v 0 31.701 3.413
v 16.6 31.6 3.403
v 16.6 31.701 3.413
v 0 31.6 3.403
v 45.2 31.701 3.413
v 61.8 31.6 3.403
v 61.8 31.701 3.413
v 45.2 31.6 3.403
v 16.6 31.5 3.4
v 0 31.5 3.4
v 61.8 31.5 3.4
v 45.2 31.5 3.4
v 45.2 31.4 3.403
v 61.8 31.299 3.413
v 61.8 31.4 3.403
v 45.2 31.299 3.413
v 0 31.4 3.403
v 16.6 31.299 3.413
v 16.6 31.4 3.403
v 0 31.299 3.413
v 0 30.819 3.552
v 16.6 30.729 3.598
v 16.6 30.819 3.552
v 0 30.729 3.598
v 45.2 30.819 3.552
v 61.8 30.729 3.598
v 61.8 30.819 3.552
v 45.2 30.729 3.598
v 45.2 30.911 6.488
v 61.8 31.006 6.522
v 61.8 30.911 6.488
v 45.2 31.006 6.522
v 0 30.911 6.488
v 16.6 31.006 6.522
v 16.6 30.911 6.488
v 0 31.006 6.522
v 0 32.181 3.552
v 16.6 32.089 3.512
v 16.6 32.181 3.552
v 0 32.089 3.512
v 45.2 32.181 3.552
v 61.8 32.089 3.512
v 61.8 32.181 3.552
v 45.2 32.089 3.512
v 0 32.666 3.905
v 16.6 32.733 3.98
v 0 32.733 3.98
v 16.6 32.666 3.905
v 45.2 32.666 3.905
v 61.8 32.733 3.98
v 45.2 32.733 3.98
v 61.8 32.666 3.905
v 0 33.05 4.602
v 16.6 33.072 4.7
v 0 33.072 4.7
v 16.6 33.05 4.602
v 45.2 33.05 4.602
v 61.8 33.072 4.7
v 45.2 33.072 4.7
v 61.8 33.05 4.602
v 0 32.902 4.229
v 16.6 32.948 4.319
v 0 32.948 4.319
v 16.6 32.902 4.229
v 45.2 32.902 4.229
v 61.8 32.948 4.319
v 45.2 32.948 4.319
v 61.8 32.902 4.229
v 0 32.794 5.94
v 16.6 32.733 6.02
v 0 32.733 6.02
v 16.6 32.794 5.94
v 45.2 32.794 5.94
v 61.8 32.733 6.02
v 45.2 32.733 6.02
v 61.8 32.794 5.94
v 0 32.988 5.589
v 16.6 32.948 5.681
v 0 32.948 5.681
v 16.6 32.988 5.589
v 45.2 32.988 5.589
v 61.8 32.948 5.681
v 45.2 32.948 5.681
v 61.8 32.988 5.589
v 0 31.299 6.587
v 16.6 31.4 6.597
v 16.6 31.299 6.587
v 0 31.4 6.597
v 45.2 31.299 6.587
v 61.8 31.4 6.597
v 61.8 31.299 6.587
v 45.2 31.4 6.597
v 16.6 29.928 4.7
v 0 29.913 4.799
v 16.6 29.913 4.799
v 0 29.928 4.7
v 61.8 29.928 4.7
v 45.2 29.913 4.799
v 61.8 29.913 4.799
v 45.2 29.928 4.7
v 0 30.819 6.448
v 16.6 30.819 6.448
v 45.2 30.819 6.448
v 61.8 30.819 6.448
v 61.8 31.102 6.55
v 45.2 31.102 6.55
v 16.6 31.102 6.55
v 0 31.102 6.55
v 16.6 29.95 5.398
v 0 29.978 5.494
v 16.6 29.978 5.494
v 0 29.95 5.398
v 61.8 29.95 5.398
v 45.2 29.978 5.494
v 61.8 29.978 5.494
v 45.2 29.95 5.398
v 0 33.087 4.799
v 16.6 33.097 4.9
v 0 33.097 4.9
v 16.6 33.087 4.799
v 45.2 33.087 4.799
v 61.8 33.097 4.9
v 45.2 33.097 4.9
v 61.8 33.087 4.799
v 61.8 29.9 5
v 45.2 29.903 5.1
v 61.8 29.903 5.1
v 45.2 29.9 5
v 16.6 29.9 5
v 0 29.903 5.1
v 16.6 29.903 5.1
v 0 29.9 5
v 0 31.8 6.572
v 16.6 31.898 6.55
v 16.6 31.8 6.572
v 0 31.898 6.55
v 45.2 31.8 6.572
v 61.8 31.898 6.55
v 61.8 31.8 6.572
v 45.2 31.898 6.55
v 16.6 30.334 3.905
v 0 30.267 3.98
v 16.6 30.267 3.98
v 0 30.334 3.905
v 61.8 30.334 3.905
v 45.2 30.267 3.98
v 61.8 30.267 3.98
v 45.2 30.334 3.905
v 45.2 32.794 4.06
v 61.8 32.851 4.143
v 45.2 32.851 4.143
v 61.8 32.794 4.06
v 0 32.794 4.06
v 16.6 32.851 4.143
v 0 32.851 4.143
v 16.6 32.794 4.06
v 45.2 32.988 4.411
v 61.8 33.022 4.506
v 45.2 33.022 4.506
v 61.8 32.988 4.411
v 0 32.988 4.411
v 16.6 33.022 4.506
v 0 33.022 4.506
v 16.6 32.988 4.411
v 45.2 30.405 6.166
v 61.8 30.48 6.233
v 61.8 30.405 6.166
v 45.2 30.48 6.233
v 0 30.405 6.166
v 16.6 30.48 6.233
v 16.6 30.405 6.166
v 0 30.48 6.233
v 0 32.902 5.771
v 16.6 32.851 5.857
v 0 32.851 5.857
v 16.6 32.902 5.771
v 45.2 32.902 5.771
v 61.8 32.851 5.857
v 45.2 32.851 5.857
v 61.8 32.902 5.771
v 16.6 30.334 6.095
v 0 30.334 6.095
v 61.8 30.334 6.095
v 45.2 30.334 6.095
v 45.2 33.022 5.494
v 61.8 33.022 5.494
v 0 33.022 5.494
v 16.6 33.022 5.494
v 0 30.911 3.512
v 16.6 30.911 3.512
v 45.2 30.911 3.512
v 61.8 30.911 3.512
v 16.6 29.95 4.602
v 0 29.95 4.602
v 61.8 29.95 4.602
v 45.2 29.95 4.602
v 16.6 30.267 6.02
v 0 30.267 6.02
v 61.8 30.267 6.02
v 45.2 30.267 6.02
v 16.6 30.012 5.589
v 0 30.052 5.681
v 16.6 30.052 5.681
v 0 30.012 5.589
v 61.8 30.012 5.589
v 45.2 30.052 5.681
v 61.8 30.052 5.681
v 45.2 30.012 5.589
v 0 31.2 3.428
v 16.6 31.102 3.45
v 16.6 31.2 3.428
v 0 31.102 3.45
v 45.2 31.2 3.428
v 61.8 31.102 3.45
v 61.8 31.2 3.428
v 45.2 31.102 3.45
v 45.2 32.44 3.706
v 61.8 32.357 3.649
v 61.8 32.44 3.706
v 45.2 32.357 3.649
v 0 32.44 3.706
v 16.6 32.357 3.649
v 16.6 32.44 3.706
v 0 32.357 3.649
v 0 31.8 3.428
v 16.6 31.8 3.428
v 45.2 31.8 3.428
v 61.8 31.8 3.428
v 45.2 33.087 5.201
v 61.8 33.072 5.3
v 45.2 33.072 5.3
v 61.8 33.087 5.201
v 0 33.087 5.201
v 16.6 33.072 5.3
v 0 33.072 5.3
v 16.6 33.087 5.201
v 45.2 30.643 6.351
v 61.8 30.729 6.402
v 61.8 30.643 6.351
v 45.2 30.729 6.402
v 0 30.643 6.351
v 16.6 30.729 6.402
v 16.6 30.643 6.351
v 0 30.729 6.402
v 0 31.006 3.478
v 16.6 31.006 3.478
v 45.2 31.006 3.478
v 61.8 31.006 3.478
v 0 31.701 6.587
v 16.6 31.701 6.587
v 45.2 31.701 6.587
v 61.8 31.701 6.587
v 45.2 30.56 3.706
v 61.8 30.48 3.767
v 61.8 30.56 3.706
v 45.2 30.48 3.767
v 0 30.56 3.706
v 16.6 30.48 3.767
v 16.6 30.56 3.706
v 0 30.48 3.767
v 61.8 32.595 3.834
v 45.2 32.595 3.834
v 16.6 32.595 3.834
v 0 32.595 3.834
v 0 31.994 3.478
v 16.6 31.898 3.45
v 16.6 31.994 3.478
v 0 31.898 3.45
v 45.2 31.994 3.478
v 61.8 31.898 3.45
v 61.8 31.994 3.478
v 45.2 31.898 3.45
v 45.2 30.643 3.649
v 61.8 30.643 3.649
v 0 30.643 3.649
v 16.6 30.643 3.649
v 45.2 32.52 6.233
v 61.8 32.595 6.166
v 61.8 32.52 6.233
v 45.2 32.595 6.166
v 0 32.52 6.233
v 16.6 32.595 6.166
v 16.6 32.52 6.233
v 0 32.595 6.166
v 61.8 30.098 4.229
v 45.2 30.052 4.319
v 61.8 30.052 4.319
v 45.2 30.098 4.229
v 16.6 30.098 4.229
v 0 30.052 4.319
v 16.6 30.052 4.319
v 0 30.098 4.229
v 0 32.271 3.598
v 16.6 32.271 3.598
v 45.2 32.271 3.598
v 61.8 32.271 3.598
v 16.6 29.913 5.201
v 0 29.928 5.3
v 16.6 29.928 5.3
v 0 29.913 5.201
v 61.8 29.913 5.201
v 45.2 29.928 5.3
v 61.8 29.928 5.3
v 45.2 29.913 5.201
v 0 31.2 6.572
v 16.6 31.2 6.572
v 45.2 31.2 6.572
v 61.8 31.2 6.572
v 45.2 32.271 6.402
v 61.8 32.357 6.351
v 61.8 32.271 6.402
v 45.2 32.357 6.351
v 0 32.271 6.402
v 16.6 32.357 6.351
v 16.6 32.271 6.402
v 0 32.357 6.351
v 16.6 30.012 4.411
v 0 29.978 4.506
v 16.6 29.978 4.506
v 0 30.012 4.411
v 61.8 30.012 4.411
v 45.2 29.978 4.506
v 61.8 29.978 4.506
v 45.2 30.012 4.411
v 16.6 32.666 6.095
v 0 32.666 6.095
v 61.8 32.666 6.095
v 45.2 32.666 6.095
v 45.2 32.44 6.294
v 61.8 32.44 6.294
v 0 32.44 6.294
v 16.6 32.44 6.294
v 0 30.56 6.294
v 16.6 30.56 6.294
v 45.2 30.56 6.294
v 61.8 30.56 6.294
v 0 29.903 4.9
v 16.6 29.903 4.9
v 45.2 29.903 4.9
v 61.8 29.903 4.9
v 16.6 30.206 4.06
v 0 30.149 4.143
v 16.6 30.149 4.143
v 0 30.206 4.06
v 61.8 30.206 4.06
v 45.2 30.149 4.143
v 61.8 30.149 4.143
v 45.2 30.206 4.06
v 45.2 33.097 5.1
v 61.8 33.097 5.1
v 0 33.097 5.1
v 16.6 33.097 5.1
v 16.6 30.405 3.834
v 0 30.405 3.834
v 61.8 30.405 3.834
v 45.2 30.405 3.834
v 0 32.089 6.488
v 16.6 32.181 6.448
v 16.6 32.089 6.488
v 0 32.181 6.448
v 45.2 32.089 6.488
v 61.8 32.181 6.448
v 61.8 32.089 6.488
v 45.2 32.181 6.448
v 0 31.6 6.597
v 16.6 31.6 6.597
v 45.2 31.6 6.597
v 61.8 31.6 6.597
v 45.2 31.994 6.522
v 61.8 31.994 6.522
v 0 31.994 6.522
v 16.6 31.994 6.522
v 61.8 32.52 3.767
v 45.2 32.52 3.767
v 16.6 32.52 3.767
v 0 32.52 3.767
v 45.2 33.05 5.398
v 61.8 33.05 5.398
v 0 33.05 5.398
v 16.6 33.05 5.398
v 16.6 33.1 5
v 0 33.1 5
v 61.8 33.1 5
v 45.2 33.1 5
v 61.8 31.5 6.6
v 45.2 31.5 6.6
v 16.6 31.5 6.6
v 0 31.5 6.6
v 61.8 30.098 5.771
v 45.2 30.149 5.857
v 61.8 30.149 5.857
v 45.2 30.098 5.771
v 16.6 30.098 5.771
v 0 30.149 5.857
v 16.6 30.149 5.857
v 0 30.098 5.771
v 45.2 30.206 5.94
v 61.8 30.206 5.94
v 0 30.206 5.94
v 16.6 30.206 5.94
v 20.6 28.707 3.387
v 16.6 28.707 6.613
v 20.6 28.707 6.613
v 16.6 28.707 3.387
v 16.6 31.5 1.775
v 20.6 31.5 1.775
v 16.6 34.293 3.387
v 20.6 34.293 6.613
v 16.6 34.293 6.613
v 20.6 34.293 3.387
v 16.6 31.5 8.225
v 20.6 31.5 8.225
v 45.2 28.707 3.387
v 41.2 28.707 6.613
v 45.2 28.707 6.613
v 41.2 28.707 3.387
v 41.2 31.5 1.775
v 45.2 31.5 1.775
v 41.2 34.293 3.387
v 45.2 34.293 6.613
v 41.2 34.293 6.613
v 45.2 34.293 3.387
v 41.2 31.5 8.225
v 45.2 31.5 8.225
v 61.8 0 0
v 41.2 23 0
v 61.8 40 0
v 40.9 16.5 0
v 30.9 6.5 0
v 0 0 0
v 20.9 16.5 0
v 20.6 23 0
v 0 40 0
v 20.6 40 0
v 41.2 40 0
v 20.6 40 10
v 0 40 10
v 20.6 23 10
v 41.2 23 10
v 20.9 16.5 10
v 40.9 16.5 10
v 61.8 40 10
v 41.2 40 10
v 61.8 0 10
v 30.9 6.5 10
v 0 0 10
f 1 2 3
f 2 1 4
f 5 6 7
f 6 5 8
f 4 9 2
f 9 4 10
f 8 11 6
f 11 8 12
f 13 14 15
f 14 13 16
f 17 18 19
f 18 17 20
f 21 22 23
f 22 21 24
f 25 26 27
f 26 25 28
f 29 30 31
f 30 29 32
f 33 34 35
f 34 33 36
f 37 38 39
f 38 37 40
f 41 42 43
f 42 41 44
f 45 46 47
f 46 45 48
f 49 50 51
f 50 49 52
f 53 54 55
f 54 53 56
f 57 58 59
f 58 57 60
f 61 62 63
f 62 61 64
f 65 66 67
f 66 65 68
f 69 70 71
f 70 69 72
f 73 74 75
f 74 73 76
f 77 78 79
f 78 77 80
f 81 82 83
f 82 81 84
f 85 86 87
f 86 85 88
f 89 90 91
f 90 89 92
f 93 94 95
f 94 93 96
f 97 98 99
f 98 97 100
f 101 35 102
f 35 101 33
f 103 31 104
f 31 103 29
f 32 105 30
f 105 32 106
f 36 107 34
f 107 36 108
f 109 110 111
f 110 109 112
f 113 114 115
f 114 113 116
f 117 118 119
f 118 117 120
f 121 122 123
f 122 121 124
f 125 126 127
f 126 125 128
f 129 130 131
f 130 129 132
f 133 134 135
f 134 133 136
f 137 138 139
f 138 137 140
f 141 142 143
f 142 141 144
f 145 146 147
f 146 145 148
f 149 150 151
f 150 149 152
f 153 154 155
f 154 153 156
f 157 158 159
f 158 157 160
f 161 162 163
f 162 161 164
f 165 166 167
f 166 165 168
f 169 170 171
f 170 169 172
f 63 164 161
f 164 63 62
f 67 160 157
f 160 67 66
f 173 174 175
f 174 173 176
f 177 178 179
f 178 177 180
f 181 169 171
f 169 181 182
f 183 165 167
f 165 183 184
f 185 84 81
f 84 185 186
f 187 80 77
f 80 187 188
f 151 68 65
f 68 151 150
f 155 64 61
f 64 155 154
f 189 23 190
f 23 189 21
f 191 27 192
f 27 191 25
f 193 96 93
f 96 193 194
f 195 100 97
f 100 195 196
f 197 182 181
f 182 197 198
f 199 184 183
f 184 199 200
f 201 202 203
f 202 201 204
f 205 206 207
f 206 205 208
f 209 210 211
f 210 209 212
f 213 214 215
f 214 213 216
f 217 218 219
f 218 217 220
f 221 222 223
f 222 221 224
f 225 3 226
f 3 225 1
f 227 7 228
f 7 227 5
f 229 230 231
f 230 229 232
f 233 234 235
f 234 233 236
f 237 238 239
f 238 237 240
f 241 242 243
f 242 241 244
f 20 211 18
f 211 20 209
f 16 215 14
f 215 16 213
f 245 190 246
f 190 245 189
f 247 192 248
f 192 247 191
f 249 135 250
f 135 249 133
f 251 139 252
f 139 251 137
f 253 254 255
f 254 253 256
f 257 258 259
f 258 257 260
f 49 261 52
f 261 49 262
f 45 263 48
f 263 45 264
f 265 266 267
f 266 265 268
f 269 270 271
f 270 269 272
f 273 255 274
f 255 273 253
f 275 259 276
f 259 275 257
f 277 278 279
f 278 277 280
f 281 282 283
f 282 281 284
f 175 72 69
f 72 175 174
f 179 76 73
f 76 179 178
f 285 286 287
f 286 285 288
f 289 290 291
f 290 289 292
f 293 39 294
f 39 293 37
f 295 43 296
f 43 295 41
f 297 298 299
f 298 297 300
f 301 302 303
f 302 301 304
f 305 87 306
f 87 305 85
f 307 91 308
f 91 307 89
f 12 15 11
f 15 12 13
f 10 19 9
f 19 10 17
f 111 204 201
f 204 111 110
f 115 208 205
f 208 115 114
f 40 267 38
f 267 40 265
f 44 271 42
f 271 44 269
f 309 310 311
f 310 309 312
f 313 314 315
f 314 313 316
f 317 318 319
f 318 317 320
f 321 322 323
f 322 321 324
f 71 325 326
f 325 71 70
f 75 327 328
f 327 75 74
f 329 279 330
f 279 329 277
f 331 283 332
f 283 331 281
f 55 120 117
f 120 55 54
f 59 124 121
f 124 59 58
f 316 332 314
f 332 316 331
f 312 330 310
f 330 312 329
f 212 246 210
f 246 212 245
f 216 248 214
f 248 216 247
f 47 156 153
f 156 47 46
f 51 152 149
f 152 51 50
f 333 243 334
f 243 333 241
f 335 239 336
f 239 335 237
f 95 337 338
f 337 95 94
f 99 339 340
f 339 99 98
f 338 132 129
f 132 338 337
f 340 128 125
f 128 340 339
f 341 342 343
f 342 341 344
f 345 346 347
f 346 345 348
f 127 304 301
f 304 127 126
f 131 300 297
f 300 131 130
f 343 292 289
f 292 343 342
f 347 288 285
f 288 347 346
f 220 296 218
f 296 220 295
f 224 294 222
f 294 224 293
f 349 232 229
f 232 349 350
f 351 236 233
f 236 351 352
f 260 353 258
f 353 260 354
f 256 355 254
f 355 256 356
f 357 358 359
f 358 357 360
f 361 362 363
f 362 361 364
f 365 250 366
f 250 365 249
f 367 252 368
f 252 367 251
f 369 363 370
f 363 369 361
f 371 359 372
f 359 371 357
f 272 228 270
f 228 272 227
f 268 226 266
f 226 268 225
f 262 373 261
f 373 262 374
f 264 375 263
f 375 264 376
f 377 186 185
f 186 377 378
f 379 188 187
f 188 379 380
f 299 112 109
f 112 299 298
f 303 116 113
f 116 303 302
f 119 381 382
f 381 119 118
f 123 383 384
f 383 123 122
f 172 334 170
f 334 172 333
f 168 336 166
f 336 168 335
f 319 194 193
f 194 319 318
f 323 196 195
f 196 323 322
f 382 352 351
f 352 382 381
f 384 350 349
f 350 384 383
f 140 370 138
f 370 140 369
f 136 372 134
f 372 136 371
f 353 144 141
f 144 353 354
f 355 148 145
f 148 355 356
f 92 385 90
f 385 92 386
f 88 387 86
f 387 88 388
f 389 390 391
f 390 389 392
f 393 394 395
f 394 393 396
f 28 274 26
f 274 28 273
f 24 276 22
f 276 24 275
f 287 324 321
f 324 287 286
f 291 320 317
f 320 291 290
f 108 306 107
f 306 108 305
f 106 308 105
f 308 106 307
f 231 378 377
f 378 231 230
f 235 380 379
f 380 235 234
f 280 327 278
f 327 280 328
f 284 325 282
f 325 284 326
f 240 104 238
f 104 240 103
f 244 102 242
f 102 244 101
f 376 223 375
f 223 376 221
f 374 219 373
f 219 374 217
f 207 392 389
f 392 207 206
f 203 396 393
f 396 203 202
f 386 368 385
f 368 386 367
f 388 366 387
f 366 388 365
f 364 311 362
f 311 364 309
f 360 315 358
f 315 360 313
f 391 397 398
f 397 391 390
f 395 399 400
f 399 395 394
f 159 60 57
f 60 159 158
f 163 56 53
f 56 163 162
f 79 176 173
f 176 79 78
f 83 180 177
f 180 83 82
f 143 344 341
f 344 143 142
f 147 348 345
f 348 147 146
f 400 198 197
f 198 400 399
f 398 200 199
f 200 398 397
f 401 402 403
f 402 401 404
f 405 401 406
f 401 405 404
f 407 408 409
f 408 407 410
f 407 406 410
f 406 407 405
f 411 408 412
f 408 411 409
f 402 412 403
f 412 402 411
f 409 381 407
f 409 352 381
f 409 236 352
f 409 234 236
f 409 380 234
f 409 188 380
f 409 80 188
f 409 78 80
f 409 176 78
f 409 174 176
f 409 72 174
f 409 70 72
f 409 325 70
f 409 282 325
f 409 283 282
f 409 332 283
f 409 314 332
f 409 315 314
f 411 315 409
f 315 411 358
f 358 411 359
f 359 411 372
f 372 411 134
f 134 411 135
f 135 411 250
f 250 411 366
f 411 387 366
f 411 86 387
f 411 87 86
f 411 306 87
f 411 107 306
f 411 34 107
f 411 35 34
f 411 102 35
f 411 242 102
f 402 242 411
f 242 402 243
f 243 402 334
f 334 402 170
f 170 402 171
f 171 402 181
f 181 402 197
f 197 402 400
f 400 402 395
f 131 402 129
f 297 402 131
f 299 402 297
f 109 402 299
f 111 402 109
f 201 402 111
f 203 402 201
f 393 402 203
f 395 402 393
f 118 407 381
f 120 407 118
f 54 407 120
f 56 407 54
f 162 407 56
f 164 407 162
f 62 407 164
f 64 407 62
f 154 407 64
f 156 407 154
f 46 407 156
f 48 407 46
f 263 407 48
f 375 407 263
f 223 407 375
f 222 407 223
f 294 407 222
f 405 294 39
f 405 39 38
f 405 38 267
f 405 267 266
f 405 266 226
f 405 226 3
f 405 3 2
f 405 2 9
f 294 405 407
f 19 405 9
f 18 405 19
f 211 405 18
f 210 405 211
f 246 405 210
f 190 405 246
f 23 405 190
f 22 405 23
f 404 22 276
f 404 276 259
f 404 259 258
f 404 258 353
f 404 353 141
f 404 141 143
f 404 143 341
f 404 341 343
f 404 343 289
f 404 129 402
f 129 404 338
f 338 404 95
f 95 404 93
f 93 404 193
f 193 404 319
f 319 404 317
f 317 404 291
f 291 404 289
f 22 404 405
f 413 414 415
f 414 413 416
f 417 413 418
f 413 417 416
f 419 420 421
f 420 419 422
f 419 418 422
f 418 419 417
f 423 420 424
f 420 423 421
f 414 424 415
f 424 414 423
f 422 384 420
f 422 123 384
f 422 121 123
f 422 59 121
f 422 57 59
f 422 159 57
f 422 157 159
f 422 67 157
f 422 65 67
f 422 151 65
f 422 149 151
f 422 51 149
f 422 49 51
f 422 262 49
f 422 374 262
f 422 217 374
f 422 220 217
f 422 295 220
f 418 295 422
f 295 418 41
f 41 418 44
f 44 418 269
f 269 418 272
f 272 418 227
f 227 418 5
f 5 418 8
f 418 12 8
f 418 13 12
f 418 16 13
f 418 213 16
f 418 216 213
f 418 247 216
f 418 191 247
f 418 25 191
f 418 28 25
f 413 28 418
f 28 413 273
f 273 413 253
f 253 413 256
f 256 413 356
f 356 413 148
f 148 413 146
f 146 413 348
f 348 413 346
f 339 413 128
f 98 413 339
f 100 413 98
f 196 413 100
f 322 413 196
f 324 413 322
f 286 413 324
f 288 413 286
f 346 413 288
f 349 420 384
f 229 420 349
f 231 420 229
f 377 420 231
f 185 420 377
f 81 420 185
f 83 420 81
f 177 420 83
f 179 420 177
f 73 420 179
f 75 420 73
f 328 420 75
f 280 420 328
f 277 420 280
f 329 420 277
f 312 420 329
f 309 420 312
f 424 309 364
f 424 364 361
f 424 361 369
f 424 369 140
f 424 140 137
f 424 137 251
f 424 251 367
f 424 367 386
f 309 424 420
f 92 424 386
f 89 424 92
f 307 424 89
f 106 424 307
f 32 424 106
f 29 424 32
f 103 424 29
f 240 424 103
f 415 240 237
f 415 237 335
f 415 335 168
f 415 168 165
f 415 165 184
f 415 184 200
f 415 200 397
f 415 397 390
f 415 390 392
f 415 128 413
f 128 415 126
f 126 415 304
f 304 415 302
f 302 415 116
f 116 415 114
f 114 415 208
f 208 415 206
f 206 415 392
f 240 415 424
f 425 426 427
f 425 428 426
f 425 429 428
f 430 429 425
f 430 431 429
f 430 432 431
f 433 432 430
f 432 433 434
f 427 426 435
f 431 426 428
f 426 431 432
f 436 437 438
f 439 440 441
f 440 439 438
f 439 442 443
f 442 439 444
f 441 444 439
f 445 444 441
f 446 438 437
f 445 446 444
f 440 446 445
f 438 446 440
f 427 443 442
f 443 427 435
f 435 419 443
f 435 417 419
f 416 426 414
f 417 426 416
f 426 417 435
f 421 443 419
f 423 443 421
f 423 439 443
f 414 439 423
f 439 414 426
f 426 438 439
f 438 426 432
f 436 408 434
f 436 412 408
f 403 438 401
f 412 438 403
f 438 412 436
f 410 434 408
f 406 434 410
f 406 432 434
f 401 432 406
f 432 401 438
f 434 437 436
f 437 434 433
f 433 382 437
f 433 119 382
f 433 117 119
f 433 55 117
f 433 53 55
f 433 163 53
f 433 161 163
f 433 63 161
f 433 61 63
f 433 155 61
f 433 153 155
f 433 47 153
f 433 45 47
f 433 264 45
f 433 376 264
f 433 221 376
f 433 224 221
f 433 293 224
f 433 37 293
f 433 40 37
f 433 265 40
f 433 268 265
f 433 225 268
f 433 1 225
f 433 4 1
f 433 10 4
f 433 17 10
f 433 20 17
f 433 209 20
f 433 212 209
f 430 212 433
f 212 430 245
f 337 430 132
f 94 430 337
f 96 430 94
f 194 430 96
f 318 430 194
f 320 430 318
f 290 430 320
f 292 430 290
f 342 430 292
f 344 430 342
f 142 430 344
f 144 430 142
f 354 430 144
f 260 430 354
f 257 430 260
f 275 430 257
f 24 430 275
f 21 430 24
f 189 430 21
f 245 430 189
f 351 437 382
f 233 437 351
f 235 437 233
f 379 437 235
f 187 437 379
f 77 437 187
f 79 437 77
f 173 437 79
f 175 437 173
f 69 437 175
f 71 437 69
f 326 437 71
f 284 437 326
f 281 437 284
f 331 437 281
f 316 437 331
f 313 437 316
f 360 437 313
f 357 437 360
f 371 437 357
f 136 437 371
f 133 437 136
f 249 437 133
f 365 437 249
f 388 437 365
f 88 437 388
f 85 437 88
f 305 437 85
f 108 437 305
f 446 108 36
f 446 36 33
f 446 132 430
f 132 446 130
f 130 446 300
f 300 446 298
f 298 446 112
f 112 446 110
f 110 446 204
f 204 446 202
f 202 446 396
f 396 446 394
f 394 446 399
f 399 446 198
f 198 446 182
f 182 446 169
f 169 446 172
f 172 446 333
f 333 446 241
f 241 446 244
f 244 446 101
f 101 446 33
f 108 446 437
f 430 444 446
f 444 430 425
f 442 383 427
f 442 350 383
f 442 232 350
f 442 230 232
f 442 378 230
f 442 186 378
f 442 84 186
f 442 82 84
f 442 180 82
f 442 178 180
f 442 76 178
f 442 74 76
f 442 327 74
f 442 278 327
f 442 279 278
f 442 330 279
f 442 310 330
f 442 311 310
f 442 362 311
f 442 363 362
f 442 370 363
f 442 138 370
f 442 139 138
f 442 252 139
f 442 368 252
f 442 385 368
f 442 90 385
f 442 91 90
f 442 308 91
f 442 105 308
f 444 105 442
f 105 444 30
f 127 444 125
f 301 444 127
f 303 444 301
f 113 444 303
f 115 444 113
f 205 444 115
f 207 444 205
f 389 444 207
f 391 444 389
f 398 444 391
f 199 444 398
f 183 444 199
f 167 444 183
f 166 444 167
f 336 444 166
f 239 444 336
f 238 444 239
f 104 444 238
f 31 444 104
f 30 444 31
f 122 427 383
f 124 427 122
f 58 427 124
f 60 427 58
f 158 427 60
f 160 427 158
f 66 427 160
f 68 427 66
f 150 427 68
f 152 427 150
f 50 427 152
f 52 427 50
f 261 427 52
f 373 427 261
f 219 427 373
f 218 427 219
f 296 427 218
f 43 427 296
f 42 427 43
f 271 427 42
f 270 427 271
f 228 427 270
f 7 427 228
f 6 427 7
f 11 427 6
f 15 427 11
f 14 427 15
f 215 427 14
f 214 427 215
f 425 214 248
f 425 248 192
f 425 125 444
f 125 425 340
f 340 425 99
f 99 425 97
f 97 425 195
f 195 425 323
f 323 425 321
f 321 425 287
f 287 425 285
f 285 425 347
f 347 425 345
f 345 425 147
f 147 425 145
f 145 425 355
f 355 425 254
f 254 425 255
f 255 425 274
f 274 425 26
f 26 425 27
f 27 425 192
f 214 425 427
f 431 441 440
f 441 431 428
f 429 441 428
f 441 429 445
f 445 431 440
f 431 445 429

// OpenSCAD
// file: iso3167.scad
iso3167_A = [
    "l1", 80,
    "l2", (104+113)/2,
    "l3", 170,
    "b1", 10,
    "b2", 20.0,
    "r", 24,
    "h", 4.0
];

iso3167_B = [
    "l1", 60.0,
    "l2", (106+110)/2,
    "l3", 150,
    "b1", 10,
    "b2", 20.0,
    "r", 60.0,
    "h", 4.0
];

function hash(h, k)=
(
    h[search([k], [for(i=[0:2:len(h)-2])h[i]])[0]*2+1]
);

module iso3167(
    l1 = undef,
    l2 = undef,
    l3 = undef,
    b1 = undef,
    b2 = undef,
    r = undef,
    h = undef,
    type = "A") {

    m_l1 = (l1 != undef) ? l1 : (type=="A" ? hash(iso3167_A,"l1") : type=="B" ? hash(iso3167_B, "l1") : undef);
    m_l2_max = (l2 != undef) ? l2 : (type=="A" ? hash(iso3167_A,"l2") : type=="B" ? hash(iso3167_B, "l2") : undef);
    m_l3 = (l3 != undef) ? l3 : (type=="A" ? hash(iso3167_A,"l3") : type=="B" ? hash(iso3167_B, "l3") : undef);
    m_b1 = (b1 != undef) ? b1 : (type=="A" ? hash(iso3167_A,"b1") : type=="B" ? hash(iso3167_B, "b1") : undef);
    m_b2 = (b2 != undef) ? b2 : (type=="A" ? hash(iso3167_A,"b2") : type=="B" ? hash(iso3167_B, "b2") : undef);
    m_r = (r != undef) ? r : (type=="A" ? hash(iso3167_A,"r") : type=="B" ? hash(iso3167_B, "r") : undef);
    m_h = (h != undef) ? h : (type=="A" ? hash(iso3167_A,"h") : type=="B" ? hash(iso3167_B, "h") : undef);

    neck_cut_width = (m_b2 - m_b1)/2;

    theta = acos((m_r - neck_cut_width)/m_r);
    fillet_width = sin(theta);
    m_l2 = ((m_l2_max - m_l1)/2 >= fillet_width) ? m_l2_max : m_l3 - 2*fillet_width ;

    neck_cut_xoff = (m_l3 - m_l1)/2;
    neck_cut_yoff = (m_b2 - neck_cut_width);

    neck_fillet_xoff1 = neck_cut_xoff;
    neck_fillet_xoff2 = m_l3 - neck_cut_xoff;
    neck_fillet_yoff1 = -m_r + neck_cut_width;
    neck_fillet_yoff2 = neck_cut_yoff + m_r;


    linear_extrude(height=m_h) {
        difference() {
            // Bounding rectangle
            square([m_l3, m_b2]);

            // Neck area
            translate([neck_cut_xoff, 0])
                square([m_l1, neck_cut_width]);
            translate([neck_cut_xoff, neck_cut_yoff])
                square([m_l1, neck_cut_width]);


            translate([neck_fillet_xoff1, neck_fillet_yoff1])
                circle(r=m_r);
            translate([neck_fillet_xoff1, neck_fillet_yoff2])
                circle(r=m_r);
            translate([neck_fillet_xoff2, neck_fillet_yoff1])
                circle(r=m_r);
            translate([neck_fillet_xoff2, neck_fillet_yoff2])
                circle(r=m_r);
        }
    }
};

module iso3167_clamp(
    l1 = undef,
    l2 = undef,
    l3 = undef,
    b1 = undef,
    b2 = undef,
    r = undef,
    h = undef,
    depth = undef,
    width = undef,
    outer_width = undef,
    outer_depth = undef,
    tri_width = undef,
    tol = 0.3,
    hole_dia = 3.2,
    nut_width = 5.5,
    nut_depth = 3,
    type = "A") {


    m_l1 = (l1 != undef) ? l1 : (type=="A" ? hash(iso3167_A,"l1") : type=="B" ? hash(iso3167_B, "l1") : undef);
    m_l2_max = (l2 != undef) ? l2 : (type=="A" ? hash(iso3167_A,"l2") : type=="B" ? hash(iso3167_B, "l2") : undef);
    m_l3 = (l3 != undef) ? l3 : (type=="A" ? hash(iso3167_A,"l3") : type=="B" ? hash(iso3167_B, "l3") : undef);
    m_b1 = (b1 != undef) ? b1 : (type=="A" ? hash(iso3167_A,"b1") : type=="B" ? hash(iso3167_B, "b1") : undef);
    m_b2 = (b2 != undef) ? b2 : (type=="A" ? hash(iso3167_A,"b2") : type=="B" ? hash(iso3167_B, "b2") : undef);
    m_r = (r != undef) ? r : (type=="A" ? hash(iso3167_A,"r") : type=="B" ? hash(iso3167_B, "r") : undef);
    m_h = (h != undef) ? h : (type=="A" ? hash(iso3167_A,"h") : type=="B" ? hash(iso3167_B, "h") : undef);

    neck_cut_width = (m_b2 - m_b1)/2;

    theta = acos((m_r - neck_cut_width)/m_r);
    fillet_width = sin(theta);
    m_l2 = ((m_l2_max - m_l1)/2 >= fillet_width) ? m_l2_max : m_l3 - 2*fillet_width ;

    m_depth = (depth != undef) ? depth : (m_l3 - m_l2)/1;
    m_width = (width != undef) ? width :  m_b2 + tol*2;
    m_outer_depth = (outer_depth != undef) ? outer_depth : m_b2 * 2;
    m_outer_width = (outer_width != undef) ? outer_width : m_width * 3;
    m_tri_width = (tri_width != undef) ? tri_width :  m_b2;
    m_tri_depth = m_tri_width / 2;

    echo(m_depth);

    difference() {
        linear_extrude(height=m_h) {
            difference() {
                square([m_outer_width, m_outer_depth]);

                translate([(m_outer_width - m_width)/2, m_outer_depth - m_depth])
                    square([m_width, m_depth]);

                translate([m_outer_width/2, (m_outer_depth - m_depth)/2])
                    polygon(points=[
                        [-m_tri_width/2, m_tri_depth/2],
                        [m_tri_width/2, m_tri_depth/2],
                        [0, -m_tri_depth/2]]);
            }
        }

        translate([0, m_outer_depth - m_depth/2, m_h/2])
            rotate([0, 90, 0])
                union() {
                    translate([0,0,-0.0001])
                        cylinder(d=hole_dia, h=m_outer_width + 0.0002);

                    translate([0,0, (m_outer_width - m_width)/2 - nut_depth + 0.0001])
                        cylinder(r=nut_width/2/cos(180/6) + 0.05, h=nut_depth, $fn=6);

                    translate([0,0, m_outer_width - (m_outer_width - m_width)/2 - 0.0001])
                        cylinder(r=nut_width/2/cos(180/6) + 0.05, h=nut_depth, $fn=6);
                }
    }
}
// main file
include <iso3167.scad>

$fn = 100;
iso3167_clamp(type="B", h=10, l3=125, l1=40, nut_depth=4);
